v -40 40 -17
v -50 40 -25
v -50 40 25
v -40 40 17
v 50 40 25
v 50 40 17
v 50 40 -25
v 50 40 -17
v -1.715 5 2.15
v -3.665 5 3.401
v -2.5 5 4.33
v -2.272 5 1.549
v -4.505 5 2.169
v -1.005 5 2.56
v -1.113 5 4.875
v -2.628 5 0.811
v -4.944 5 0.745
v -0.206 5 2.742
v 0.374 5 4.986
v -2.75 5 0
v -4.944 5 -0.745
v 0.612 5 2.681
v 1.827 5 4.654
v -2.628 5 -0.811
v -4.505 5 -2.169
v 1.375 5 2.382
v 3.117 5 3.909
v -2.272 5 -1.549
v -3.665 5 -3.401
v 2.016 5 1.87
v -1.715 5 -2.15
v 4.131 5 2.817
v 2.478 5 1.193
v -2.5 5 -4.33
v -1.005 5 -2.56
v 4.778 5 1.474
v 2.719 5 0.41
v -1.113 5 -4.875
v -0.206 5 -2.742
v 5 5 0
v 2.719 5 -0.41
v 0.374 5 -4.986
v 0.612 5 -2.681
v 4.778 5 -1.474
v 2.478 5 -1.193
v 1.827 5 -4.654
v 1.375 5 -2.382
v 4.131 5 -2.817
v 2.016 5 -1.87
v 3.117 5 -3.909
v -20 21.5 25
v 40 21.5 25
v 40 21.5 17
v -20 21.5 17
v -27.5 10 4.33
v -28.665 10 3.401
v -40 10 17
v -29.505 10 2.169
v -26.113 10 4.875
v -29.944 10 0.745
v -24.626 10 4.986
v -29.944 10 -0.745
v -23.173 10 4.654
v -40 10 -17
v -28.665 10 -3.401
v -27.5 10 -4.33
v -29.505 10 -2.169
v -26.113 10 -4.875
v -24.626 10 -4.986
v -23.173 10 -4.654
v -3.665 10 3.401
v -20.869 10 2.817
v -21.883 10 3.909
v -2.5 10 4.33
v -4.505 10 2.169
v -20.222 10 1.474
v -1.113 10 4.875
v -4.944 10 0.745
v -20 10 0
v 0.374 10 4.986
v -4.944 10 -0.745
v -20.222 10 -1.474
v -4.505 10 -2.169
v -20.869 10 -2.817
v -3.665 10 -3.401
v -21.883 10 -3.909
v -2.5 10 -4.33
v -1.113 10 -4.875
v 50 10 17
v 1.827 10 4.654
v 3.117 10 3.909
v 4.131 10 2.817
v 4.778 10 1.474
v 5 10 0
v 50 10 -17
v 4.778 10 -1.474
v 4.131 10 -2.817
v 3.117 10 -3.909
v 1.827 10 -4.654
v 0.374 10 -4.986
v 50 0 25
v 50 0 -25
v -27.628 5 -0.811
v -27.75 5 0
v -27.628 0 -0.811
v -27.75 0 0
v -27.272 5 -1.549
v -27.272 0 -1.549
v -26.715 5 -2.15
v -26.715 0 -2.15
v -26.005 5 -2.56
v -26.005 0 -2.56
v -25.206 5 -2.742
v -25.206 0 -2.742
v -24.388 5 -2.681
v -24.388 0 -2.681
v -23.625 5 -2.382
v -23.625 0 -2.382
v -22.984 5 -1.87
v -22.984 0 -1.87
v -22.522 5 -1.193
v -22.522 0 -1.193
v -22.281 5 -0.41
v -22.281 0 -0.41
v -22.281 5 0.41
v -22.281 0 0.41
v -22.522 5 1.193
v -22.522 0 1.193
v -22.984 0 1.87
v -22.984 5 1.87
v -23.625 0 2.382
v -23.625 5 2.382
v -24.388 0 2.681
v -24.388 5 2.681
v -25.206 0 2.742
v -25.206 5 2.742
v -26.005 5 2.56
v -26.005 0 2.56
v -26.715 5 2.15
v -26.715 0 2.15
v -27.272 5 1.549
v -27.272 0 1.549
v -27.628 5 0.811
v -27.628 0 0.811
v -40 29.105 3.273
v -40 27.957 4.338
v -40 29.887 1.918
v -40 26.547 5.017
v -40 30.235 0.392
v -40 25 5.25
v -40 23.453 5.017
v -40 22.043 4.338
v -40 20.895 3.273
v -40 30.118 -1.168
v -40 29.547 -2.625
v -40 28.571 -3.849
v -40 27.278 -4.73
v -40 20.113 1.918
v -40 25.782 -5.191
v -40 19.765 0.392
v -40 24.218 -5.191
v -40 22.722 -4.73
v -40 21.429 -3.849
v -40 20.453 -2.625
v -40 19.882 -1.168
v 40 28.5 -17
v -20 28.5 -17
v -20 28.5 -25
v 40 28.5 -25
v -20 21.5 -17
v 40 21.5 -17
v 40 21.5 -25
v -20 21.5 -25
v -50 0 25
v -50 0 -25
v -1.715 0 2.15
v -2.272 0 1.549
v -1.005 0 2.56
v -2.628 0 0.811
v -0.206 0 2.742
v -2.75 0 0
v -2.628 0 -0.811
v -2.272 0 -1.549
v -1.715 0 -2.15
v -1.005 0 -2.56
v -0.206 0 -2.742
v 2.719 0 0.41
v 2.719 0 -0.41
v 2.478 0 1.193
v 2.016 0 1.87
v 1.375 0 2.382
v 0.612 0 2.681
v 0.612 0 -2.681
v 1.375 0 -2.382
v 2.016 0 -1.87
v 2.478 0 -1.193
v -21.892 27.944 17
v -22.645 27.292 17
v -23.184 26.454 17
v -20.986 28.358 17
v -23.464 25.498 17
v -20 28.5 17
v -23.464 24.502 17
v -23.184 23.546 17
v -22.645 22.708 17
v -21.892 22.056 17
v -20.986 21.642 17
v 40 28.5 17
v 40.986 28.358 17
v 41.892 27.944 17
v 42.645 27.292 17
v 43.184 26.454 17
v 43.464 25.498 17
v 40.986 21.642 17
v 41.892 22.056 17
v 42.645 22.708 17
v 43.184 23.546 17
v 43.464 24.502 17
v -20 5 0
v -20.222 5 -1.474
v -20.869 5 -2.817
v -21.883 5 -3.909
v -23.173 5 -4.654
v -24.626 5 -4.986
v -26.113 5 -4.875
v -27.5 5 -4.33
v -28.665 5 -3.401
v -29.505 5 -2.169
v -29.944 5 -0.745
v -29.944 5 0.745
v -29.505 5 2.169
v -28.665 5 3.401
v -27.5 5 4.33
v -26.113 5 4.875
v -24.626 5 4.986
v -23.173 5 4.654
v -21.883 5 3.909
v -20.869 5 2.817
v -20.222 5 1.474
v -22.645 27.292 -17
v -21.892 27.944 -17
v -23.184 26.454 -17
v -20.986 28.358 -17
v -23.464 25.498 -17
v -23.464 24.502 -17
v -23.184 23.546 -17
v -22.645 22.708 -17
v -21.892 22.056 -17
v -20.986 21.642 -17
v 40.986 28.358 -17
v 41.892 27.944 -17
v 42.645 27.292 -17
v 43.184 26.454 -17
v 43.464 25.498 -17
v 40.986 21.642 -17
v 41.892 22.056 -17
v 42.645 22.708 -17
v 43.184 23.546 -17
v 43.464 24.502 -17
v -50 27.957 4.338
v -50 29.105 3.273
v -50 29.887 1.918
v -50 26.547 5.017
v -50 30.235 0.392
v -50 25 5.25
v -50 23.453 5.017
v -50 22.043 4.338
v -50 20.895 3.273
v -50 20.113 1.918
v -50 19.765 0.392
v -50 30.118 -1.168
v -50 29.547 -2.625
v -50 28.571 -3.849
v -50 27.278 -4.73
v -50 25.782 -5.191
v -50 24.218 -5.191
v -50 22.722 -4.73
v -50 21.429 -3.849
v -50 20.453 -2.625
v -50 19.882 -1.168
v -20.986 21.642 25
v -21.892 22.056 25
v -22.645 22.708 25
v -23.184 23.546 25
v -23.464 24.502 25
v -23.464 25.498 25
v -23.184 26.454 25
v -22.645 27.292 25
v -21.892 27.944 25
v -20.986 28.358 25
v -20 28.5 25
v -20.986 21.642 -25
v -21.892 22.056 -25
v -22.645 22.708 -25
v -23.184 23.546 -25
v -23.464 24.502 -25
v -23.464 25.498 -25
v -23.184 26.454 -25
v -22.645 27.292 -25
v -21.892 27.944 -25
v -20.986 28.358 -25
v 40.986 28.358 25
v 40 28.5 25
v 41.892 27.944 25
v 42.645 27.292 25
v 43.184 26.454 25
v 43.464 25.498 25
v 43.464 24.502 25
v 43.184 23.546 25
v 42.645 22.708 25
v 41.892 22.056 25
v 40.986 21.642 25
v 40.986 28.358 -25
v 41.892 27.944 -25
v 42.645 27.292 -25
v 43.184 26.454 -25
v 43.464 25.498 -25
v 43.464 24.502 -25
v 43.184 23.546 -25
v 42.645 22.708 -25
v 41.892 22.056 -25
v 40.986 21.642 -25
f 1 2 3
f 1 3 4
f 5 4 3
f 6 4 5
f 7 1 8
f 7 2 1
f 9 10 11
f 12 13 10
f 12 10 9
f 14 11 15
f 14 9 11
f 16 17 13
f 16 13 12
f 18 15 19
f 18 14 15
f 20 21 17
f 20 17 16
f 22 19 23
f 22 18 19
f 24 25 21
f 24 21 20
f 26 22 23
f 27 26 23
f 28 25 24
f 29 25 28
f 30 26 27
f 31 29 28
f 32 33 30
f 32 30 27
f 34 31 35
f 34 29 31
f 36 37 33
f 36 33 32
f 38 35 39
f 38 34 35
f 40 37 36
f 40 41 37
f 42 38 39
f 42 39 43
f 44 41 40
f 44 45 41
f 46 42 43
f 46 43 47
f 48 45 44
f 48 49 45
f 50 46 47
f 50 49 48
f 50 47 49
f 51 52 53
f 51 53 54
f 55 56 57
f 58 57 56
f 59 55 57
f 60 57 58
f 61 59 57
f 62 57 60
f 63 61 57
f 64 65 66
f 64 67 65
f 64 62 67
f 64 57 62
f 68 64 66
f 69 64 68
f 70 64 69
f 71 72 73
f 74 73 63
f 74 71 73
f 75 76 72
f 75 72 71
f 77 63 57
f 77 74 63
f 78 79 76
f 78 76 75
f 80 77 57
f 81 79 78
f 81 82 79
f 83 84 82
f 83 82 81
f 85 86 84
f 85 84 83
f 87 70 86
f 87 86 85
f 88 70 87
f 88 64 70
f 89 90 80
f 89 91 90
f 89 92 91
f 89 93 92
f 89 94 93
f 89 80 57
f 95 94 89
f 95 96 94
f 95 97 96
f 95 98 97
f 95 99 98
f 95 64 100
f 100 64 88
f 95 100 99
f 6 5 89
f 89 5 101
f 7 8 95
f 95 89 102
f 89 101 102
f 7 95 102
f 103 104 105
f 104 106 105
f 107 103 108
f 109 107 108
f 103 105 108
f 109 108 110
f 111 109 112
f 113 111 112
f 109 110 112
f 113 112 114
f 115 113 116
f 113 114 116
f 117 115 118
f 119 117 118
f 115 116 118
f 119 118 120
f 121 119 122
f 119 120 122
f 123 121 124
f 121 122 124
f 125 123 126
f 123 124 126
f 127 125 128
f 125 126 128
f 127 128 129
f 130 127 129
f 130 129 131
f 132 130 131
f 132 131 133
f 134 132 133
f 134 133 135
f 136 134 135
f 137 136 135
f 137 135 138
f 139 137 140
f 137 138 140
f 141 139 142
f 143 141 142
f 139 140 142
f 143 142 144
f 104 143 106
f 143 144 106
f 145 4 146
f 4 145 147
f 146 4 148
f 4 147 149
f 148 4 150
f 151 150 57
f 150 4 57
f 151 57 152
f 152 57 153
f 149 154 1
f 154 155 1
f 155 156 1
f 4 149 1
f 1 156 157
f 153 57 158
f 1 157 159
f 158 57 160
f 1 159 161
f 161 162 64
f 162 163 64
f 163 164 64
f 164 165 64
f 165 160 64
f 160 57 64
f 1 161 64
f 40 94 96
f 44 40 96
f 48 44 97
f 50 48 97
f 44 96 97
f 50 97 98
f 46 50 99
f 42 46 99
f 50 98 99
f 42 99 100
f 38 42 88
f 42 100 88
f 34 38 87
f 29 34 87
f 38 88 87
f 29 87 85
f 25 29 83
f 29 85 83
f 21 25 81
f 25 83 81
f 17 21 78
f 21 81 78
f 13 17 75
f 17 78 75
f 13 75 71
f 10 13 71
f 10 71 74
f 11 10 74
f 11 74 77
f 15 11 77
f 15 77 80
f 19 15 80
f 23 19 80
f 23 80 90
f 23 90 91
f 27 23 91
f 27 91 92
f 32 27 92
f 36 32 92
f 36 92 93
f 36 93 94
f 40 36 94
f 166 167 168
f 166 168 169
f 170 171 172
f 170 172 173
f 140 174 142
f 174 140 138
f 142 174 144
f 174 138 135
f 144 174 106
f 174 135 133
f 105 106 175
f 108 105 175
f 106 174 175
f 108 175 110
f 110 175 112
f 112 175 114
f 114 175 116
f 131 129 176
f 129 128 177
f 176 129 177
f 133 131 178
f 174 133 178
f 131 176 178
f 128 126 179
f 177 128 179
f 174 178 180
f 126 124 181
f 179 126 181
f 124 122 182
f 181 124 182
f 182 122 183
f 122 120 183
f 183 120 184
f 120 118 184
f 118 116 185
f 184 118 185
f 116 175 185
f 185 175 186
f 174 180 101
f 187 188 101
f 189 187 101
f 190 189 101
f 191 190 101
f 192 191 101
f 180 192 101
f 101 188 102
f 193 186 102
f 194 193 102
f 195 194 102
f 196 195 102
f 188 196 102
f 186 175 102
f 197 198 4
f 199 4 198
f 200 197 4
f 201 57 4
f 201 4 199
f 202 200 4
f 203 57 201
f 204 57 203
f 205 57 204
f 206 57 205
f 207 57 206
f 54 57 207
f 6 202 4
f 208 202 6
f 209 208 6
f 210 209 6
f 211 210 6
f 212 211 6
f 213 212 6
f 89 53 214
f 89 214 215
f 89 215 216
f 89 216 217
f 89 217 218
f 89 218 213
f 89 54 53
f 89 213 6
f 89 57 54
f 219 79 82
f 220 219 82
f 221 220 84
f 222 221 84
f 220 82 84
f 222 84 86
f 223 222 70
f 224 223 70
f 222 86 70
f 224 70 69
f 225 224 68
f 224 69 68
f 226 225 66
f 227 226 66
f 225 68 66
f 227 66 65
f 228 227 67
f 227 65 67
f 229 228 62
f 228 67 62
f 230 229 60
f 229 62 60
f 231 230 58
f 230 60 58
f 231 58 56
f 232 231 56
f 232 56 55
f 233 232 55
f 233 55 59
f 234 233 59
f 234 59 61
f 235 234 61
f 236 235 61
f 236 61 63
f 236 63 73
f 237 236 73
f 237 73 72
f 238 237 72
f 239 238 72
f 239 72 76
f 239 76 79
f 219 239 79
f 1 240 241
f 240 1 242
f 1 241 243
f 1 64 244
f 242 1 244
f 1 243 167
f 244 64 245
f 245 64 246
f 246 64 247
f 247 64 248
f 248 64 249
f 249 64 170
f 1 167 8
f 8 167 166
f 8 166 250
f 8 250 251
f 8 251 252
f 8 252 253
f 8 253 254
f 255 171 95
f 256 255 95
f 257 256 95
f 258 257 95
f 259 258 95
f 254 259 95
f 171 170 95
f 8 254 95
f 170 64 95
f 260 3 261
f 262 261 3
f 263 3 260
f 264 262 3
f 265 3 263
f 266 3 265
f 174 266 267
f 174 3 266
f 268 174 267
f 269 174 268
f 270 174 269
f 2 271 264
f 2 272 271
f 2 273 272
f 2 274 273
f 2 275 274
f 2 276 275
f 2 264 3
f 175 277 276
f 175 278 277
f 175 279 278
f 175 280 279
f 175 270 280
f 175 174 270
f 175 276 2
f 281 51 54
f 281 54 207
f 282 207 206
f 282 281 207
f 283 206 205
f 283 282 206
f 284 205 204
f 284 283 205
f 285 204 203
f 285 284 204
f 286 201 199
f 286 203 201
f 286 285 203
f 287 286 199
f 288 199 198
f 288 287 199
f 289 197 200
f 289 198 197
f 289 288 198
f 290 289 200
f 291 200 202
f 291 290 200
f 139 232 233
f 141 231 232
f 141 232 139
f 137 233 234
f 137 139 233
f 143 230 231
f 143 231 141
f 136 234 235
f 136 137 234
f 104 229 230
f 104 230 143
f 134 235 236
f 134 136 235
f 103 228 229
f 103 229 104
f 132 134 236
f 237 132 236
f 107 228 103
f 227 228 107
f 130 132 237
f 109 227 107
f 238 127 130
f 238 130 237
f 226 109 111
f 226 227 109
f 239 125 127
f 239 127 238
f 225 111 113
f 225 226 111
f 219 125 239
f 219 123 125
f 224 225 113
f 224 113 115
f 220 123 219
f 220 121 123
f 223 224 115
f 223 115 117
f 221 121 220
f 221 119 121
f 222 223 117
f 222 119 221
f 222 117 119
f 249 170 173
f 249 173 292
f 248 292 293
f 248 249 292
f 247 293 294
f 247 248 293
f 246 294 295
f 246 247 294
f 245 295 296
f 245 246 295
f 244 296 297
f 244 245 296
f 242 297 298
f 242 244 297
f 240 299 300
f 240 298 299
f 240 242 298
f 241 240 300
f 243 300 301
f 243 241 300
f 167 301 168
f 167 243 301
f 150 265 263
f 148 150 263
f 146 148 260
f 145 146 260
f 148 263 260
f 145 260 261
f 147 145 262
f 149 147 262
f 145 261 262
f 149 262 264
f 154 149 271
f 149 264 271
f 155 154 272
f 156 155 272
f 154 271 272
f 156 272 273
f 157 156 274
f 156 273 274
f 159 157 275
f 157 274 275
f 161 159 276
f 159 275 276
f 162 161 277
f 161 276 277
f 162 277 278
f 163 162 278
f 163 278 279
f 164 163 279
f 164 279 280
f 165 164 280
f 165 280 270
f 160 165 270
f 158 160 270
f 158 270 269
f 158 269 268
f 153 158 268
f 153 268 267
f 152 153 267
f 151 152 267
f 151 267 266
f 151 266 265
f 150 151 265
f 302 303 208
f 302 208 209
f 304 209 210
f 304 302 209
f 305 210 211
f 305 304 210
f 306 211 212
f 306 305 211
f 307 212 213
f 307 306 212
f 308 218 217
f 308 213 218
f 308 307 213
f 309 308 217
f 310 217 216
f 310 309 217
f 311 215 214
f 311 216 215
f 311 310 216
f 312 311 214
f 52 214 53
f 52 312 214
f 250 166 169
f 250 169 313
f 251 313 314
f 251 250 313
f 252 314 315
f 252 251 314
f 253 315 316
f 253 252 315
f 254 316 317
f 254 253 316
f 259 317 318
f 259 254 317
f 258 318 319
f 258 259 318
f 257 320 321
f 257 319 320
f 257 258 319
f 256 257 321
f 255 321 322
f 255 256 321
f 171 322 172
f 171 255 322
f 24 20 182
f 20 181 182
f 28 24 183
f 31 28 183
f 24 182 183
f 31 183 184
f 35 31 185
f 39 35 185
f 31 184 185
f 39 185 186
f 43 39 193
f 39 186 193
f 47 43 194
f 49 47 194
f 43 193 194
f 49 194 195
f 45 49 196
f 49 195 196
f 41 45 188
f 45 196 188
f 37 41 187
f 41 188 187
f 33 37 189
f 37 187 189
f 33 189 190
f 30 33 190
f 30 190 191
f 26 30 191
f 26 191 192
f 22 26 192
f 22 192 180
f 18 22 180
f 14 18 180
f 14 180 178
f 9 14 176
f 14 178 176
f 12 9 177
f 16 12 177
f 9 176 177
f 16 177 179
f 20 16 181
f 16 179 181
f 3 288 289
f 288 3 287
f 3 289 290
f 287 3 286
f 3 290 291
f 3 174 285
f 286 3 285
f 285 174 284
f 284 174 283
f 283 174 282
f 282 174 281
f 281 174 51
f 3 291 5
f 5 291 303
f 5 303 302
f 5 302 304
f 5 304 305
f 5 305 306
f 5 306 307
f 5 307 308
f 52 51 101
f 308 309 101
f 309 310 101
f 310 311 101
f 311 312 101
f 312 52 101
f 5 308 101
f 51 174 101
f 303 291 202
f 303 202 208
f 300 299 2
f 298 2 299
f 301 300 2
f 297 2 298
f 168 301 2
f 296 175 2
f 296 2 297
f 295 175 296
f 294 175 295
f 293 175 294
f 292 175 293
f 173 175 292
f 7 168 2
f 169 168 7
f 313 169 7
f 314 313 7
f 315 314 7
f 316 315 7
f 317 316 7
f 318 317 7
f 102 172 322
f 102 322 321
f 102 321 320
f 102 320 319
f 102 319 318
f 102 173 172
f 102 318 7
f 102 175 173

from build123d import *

# Parameters (mm, degrees)
ESQUISSE1_W                                        = 100
ESQUISSE1_H                                        = 50
BOSS_EXTRU_1_DEPTH                                 = 10
ESQUISSE2_W                                        = 100
ESQUISSE2_H                                        = 8
BOSS_EXTRU_2_DEPTH                                 = 30
ESQUISSE3_W                                        = 10
ESQUISSE3_H                                        = 34
BOSS_EXTRU_3_DEPTH                                 = 30
ESQUISSE5_R                                        = 5.25
ENL_V_MAT_EXTRU_1_DEPTH                            = 111.566721937
ENL_V_MAT_EXTRU_4_DEPTH                            = 82.240384046
CHAMBRAGE_POUR_VIS_T_TE_RONDE_BOMB_E_M_D           = 5.5
CHAMBRAGE_POUR_VIS_T_TE_RONDE_BOMB_E_M_CBORE_D     = 10
CHAMBRAGE_POUR_VIS_T_TE_RONDE_BOMB_E_M_CBORE_DEPTH = 5


with BuildPart() as part:
    # Esquisse1 → Boss.-Extru.1 (new body)
    with BuildSketch(Plane(origin=(0, 0, 0), x_dir=(1, 0, 0), z_dir=(0, 1, 0))):
        Rectangle(ESQUISSE1_W, ESQUISSE1_H)
    extrude(amount=BOSS_EXTRU_1_DEPTH)

    # Esquisse2 → Boss.-Extru.2 (add)
    with BuildSketch(Plane(origin=(0, 10, 0), x_dir=(1, 0, 0), z_dir=(0, 1, 0))):
        with Locations((0, -21)):
            Rectangle(ESQUISSE2_W, ESQUISSE2_H)
        with Locations((0, 21)):
            Rectangle(ESQUISSE2_W, ESQUISSE2_H)
    extrude(amount=BOSS_EXTRU_2_DEPTH)

    # Esquisse3 → Boss.-Extru.3 (add)
    with BuildSketch(Plane(origin=(0, 10, 0), x_dir=(1, 0, 0), z_dir=(0, 1, 0))):
        with Locations((-45, 0)):
            Rectangle(ESQUISSE3_W, ESQUISSE3_H)
    extrude(amount=BOSS_EXTRU_3_DEPTH)

    # Esquisse5 → Enlèv. mat.-Extru.1 (cut, through all)
    with BuildSketch(Plane.ZY.offset(50)):
        with Locations((0, 25)):
            Circle(ESQUISSE5_R)
    extrude(amount=-ENL_V_MAT_EXTRU_1_DEPTH, mode=Mode.SUBTRACT)

    # Esquisse8 → Enlèv. mat.-Extru.4 (cut, through all)
    with BuildSketch(Plane.XY.offset(25)):
        with BuildLine():
            Line((-20, 28.5), (40, 28.5))
            ThreePointArc((40, 28.5), (43.5, 25), (40, 21.5))
            Line((40, 21.5), (-20, 21.5))
            ThreePointArc((-20, 21.5), (-23.5, 25), (-20, 28.5))
        make_face()
    extrude(amount=-ENL_V_MAT_EXTRU_4_DEPTH, mode=Mode.SUBTRACT)

    # Chambrage pour vis à tête ronde bombée M51 (through all)
    with Locations(Plane(origin=(0, 10, 0), x_dir=(1, 0, 0), z_dir=(0, 1, 0))):
        with Locations((-25, 0), (0, 0)):
            CounterBoreHole(CHAMBRAGE_POUR_VIS_T_TE_RONDE_BOMB_E_M_D / 2, CHAMBRAGE_POUR_VIS_T_TE_RONDE_BOMB_E_M_CBORE_D / 2, CHAMBRAGE_POUR_VIS_T_TE_RONDE_BOMB_E_M_CBORE_DEPTH)


solid = part.part
